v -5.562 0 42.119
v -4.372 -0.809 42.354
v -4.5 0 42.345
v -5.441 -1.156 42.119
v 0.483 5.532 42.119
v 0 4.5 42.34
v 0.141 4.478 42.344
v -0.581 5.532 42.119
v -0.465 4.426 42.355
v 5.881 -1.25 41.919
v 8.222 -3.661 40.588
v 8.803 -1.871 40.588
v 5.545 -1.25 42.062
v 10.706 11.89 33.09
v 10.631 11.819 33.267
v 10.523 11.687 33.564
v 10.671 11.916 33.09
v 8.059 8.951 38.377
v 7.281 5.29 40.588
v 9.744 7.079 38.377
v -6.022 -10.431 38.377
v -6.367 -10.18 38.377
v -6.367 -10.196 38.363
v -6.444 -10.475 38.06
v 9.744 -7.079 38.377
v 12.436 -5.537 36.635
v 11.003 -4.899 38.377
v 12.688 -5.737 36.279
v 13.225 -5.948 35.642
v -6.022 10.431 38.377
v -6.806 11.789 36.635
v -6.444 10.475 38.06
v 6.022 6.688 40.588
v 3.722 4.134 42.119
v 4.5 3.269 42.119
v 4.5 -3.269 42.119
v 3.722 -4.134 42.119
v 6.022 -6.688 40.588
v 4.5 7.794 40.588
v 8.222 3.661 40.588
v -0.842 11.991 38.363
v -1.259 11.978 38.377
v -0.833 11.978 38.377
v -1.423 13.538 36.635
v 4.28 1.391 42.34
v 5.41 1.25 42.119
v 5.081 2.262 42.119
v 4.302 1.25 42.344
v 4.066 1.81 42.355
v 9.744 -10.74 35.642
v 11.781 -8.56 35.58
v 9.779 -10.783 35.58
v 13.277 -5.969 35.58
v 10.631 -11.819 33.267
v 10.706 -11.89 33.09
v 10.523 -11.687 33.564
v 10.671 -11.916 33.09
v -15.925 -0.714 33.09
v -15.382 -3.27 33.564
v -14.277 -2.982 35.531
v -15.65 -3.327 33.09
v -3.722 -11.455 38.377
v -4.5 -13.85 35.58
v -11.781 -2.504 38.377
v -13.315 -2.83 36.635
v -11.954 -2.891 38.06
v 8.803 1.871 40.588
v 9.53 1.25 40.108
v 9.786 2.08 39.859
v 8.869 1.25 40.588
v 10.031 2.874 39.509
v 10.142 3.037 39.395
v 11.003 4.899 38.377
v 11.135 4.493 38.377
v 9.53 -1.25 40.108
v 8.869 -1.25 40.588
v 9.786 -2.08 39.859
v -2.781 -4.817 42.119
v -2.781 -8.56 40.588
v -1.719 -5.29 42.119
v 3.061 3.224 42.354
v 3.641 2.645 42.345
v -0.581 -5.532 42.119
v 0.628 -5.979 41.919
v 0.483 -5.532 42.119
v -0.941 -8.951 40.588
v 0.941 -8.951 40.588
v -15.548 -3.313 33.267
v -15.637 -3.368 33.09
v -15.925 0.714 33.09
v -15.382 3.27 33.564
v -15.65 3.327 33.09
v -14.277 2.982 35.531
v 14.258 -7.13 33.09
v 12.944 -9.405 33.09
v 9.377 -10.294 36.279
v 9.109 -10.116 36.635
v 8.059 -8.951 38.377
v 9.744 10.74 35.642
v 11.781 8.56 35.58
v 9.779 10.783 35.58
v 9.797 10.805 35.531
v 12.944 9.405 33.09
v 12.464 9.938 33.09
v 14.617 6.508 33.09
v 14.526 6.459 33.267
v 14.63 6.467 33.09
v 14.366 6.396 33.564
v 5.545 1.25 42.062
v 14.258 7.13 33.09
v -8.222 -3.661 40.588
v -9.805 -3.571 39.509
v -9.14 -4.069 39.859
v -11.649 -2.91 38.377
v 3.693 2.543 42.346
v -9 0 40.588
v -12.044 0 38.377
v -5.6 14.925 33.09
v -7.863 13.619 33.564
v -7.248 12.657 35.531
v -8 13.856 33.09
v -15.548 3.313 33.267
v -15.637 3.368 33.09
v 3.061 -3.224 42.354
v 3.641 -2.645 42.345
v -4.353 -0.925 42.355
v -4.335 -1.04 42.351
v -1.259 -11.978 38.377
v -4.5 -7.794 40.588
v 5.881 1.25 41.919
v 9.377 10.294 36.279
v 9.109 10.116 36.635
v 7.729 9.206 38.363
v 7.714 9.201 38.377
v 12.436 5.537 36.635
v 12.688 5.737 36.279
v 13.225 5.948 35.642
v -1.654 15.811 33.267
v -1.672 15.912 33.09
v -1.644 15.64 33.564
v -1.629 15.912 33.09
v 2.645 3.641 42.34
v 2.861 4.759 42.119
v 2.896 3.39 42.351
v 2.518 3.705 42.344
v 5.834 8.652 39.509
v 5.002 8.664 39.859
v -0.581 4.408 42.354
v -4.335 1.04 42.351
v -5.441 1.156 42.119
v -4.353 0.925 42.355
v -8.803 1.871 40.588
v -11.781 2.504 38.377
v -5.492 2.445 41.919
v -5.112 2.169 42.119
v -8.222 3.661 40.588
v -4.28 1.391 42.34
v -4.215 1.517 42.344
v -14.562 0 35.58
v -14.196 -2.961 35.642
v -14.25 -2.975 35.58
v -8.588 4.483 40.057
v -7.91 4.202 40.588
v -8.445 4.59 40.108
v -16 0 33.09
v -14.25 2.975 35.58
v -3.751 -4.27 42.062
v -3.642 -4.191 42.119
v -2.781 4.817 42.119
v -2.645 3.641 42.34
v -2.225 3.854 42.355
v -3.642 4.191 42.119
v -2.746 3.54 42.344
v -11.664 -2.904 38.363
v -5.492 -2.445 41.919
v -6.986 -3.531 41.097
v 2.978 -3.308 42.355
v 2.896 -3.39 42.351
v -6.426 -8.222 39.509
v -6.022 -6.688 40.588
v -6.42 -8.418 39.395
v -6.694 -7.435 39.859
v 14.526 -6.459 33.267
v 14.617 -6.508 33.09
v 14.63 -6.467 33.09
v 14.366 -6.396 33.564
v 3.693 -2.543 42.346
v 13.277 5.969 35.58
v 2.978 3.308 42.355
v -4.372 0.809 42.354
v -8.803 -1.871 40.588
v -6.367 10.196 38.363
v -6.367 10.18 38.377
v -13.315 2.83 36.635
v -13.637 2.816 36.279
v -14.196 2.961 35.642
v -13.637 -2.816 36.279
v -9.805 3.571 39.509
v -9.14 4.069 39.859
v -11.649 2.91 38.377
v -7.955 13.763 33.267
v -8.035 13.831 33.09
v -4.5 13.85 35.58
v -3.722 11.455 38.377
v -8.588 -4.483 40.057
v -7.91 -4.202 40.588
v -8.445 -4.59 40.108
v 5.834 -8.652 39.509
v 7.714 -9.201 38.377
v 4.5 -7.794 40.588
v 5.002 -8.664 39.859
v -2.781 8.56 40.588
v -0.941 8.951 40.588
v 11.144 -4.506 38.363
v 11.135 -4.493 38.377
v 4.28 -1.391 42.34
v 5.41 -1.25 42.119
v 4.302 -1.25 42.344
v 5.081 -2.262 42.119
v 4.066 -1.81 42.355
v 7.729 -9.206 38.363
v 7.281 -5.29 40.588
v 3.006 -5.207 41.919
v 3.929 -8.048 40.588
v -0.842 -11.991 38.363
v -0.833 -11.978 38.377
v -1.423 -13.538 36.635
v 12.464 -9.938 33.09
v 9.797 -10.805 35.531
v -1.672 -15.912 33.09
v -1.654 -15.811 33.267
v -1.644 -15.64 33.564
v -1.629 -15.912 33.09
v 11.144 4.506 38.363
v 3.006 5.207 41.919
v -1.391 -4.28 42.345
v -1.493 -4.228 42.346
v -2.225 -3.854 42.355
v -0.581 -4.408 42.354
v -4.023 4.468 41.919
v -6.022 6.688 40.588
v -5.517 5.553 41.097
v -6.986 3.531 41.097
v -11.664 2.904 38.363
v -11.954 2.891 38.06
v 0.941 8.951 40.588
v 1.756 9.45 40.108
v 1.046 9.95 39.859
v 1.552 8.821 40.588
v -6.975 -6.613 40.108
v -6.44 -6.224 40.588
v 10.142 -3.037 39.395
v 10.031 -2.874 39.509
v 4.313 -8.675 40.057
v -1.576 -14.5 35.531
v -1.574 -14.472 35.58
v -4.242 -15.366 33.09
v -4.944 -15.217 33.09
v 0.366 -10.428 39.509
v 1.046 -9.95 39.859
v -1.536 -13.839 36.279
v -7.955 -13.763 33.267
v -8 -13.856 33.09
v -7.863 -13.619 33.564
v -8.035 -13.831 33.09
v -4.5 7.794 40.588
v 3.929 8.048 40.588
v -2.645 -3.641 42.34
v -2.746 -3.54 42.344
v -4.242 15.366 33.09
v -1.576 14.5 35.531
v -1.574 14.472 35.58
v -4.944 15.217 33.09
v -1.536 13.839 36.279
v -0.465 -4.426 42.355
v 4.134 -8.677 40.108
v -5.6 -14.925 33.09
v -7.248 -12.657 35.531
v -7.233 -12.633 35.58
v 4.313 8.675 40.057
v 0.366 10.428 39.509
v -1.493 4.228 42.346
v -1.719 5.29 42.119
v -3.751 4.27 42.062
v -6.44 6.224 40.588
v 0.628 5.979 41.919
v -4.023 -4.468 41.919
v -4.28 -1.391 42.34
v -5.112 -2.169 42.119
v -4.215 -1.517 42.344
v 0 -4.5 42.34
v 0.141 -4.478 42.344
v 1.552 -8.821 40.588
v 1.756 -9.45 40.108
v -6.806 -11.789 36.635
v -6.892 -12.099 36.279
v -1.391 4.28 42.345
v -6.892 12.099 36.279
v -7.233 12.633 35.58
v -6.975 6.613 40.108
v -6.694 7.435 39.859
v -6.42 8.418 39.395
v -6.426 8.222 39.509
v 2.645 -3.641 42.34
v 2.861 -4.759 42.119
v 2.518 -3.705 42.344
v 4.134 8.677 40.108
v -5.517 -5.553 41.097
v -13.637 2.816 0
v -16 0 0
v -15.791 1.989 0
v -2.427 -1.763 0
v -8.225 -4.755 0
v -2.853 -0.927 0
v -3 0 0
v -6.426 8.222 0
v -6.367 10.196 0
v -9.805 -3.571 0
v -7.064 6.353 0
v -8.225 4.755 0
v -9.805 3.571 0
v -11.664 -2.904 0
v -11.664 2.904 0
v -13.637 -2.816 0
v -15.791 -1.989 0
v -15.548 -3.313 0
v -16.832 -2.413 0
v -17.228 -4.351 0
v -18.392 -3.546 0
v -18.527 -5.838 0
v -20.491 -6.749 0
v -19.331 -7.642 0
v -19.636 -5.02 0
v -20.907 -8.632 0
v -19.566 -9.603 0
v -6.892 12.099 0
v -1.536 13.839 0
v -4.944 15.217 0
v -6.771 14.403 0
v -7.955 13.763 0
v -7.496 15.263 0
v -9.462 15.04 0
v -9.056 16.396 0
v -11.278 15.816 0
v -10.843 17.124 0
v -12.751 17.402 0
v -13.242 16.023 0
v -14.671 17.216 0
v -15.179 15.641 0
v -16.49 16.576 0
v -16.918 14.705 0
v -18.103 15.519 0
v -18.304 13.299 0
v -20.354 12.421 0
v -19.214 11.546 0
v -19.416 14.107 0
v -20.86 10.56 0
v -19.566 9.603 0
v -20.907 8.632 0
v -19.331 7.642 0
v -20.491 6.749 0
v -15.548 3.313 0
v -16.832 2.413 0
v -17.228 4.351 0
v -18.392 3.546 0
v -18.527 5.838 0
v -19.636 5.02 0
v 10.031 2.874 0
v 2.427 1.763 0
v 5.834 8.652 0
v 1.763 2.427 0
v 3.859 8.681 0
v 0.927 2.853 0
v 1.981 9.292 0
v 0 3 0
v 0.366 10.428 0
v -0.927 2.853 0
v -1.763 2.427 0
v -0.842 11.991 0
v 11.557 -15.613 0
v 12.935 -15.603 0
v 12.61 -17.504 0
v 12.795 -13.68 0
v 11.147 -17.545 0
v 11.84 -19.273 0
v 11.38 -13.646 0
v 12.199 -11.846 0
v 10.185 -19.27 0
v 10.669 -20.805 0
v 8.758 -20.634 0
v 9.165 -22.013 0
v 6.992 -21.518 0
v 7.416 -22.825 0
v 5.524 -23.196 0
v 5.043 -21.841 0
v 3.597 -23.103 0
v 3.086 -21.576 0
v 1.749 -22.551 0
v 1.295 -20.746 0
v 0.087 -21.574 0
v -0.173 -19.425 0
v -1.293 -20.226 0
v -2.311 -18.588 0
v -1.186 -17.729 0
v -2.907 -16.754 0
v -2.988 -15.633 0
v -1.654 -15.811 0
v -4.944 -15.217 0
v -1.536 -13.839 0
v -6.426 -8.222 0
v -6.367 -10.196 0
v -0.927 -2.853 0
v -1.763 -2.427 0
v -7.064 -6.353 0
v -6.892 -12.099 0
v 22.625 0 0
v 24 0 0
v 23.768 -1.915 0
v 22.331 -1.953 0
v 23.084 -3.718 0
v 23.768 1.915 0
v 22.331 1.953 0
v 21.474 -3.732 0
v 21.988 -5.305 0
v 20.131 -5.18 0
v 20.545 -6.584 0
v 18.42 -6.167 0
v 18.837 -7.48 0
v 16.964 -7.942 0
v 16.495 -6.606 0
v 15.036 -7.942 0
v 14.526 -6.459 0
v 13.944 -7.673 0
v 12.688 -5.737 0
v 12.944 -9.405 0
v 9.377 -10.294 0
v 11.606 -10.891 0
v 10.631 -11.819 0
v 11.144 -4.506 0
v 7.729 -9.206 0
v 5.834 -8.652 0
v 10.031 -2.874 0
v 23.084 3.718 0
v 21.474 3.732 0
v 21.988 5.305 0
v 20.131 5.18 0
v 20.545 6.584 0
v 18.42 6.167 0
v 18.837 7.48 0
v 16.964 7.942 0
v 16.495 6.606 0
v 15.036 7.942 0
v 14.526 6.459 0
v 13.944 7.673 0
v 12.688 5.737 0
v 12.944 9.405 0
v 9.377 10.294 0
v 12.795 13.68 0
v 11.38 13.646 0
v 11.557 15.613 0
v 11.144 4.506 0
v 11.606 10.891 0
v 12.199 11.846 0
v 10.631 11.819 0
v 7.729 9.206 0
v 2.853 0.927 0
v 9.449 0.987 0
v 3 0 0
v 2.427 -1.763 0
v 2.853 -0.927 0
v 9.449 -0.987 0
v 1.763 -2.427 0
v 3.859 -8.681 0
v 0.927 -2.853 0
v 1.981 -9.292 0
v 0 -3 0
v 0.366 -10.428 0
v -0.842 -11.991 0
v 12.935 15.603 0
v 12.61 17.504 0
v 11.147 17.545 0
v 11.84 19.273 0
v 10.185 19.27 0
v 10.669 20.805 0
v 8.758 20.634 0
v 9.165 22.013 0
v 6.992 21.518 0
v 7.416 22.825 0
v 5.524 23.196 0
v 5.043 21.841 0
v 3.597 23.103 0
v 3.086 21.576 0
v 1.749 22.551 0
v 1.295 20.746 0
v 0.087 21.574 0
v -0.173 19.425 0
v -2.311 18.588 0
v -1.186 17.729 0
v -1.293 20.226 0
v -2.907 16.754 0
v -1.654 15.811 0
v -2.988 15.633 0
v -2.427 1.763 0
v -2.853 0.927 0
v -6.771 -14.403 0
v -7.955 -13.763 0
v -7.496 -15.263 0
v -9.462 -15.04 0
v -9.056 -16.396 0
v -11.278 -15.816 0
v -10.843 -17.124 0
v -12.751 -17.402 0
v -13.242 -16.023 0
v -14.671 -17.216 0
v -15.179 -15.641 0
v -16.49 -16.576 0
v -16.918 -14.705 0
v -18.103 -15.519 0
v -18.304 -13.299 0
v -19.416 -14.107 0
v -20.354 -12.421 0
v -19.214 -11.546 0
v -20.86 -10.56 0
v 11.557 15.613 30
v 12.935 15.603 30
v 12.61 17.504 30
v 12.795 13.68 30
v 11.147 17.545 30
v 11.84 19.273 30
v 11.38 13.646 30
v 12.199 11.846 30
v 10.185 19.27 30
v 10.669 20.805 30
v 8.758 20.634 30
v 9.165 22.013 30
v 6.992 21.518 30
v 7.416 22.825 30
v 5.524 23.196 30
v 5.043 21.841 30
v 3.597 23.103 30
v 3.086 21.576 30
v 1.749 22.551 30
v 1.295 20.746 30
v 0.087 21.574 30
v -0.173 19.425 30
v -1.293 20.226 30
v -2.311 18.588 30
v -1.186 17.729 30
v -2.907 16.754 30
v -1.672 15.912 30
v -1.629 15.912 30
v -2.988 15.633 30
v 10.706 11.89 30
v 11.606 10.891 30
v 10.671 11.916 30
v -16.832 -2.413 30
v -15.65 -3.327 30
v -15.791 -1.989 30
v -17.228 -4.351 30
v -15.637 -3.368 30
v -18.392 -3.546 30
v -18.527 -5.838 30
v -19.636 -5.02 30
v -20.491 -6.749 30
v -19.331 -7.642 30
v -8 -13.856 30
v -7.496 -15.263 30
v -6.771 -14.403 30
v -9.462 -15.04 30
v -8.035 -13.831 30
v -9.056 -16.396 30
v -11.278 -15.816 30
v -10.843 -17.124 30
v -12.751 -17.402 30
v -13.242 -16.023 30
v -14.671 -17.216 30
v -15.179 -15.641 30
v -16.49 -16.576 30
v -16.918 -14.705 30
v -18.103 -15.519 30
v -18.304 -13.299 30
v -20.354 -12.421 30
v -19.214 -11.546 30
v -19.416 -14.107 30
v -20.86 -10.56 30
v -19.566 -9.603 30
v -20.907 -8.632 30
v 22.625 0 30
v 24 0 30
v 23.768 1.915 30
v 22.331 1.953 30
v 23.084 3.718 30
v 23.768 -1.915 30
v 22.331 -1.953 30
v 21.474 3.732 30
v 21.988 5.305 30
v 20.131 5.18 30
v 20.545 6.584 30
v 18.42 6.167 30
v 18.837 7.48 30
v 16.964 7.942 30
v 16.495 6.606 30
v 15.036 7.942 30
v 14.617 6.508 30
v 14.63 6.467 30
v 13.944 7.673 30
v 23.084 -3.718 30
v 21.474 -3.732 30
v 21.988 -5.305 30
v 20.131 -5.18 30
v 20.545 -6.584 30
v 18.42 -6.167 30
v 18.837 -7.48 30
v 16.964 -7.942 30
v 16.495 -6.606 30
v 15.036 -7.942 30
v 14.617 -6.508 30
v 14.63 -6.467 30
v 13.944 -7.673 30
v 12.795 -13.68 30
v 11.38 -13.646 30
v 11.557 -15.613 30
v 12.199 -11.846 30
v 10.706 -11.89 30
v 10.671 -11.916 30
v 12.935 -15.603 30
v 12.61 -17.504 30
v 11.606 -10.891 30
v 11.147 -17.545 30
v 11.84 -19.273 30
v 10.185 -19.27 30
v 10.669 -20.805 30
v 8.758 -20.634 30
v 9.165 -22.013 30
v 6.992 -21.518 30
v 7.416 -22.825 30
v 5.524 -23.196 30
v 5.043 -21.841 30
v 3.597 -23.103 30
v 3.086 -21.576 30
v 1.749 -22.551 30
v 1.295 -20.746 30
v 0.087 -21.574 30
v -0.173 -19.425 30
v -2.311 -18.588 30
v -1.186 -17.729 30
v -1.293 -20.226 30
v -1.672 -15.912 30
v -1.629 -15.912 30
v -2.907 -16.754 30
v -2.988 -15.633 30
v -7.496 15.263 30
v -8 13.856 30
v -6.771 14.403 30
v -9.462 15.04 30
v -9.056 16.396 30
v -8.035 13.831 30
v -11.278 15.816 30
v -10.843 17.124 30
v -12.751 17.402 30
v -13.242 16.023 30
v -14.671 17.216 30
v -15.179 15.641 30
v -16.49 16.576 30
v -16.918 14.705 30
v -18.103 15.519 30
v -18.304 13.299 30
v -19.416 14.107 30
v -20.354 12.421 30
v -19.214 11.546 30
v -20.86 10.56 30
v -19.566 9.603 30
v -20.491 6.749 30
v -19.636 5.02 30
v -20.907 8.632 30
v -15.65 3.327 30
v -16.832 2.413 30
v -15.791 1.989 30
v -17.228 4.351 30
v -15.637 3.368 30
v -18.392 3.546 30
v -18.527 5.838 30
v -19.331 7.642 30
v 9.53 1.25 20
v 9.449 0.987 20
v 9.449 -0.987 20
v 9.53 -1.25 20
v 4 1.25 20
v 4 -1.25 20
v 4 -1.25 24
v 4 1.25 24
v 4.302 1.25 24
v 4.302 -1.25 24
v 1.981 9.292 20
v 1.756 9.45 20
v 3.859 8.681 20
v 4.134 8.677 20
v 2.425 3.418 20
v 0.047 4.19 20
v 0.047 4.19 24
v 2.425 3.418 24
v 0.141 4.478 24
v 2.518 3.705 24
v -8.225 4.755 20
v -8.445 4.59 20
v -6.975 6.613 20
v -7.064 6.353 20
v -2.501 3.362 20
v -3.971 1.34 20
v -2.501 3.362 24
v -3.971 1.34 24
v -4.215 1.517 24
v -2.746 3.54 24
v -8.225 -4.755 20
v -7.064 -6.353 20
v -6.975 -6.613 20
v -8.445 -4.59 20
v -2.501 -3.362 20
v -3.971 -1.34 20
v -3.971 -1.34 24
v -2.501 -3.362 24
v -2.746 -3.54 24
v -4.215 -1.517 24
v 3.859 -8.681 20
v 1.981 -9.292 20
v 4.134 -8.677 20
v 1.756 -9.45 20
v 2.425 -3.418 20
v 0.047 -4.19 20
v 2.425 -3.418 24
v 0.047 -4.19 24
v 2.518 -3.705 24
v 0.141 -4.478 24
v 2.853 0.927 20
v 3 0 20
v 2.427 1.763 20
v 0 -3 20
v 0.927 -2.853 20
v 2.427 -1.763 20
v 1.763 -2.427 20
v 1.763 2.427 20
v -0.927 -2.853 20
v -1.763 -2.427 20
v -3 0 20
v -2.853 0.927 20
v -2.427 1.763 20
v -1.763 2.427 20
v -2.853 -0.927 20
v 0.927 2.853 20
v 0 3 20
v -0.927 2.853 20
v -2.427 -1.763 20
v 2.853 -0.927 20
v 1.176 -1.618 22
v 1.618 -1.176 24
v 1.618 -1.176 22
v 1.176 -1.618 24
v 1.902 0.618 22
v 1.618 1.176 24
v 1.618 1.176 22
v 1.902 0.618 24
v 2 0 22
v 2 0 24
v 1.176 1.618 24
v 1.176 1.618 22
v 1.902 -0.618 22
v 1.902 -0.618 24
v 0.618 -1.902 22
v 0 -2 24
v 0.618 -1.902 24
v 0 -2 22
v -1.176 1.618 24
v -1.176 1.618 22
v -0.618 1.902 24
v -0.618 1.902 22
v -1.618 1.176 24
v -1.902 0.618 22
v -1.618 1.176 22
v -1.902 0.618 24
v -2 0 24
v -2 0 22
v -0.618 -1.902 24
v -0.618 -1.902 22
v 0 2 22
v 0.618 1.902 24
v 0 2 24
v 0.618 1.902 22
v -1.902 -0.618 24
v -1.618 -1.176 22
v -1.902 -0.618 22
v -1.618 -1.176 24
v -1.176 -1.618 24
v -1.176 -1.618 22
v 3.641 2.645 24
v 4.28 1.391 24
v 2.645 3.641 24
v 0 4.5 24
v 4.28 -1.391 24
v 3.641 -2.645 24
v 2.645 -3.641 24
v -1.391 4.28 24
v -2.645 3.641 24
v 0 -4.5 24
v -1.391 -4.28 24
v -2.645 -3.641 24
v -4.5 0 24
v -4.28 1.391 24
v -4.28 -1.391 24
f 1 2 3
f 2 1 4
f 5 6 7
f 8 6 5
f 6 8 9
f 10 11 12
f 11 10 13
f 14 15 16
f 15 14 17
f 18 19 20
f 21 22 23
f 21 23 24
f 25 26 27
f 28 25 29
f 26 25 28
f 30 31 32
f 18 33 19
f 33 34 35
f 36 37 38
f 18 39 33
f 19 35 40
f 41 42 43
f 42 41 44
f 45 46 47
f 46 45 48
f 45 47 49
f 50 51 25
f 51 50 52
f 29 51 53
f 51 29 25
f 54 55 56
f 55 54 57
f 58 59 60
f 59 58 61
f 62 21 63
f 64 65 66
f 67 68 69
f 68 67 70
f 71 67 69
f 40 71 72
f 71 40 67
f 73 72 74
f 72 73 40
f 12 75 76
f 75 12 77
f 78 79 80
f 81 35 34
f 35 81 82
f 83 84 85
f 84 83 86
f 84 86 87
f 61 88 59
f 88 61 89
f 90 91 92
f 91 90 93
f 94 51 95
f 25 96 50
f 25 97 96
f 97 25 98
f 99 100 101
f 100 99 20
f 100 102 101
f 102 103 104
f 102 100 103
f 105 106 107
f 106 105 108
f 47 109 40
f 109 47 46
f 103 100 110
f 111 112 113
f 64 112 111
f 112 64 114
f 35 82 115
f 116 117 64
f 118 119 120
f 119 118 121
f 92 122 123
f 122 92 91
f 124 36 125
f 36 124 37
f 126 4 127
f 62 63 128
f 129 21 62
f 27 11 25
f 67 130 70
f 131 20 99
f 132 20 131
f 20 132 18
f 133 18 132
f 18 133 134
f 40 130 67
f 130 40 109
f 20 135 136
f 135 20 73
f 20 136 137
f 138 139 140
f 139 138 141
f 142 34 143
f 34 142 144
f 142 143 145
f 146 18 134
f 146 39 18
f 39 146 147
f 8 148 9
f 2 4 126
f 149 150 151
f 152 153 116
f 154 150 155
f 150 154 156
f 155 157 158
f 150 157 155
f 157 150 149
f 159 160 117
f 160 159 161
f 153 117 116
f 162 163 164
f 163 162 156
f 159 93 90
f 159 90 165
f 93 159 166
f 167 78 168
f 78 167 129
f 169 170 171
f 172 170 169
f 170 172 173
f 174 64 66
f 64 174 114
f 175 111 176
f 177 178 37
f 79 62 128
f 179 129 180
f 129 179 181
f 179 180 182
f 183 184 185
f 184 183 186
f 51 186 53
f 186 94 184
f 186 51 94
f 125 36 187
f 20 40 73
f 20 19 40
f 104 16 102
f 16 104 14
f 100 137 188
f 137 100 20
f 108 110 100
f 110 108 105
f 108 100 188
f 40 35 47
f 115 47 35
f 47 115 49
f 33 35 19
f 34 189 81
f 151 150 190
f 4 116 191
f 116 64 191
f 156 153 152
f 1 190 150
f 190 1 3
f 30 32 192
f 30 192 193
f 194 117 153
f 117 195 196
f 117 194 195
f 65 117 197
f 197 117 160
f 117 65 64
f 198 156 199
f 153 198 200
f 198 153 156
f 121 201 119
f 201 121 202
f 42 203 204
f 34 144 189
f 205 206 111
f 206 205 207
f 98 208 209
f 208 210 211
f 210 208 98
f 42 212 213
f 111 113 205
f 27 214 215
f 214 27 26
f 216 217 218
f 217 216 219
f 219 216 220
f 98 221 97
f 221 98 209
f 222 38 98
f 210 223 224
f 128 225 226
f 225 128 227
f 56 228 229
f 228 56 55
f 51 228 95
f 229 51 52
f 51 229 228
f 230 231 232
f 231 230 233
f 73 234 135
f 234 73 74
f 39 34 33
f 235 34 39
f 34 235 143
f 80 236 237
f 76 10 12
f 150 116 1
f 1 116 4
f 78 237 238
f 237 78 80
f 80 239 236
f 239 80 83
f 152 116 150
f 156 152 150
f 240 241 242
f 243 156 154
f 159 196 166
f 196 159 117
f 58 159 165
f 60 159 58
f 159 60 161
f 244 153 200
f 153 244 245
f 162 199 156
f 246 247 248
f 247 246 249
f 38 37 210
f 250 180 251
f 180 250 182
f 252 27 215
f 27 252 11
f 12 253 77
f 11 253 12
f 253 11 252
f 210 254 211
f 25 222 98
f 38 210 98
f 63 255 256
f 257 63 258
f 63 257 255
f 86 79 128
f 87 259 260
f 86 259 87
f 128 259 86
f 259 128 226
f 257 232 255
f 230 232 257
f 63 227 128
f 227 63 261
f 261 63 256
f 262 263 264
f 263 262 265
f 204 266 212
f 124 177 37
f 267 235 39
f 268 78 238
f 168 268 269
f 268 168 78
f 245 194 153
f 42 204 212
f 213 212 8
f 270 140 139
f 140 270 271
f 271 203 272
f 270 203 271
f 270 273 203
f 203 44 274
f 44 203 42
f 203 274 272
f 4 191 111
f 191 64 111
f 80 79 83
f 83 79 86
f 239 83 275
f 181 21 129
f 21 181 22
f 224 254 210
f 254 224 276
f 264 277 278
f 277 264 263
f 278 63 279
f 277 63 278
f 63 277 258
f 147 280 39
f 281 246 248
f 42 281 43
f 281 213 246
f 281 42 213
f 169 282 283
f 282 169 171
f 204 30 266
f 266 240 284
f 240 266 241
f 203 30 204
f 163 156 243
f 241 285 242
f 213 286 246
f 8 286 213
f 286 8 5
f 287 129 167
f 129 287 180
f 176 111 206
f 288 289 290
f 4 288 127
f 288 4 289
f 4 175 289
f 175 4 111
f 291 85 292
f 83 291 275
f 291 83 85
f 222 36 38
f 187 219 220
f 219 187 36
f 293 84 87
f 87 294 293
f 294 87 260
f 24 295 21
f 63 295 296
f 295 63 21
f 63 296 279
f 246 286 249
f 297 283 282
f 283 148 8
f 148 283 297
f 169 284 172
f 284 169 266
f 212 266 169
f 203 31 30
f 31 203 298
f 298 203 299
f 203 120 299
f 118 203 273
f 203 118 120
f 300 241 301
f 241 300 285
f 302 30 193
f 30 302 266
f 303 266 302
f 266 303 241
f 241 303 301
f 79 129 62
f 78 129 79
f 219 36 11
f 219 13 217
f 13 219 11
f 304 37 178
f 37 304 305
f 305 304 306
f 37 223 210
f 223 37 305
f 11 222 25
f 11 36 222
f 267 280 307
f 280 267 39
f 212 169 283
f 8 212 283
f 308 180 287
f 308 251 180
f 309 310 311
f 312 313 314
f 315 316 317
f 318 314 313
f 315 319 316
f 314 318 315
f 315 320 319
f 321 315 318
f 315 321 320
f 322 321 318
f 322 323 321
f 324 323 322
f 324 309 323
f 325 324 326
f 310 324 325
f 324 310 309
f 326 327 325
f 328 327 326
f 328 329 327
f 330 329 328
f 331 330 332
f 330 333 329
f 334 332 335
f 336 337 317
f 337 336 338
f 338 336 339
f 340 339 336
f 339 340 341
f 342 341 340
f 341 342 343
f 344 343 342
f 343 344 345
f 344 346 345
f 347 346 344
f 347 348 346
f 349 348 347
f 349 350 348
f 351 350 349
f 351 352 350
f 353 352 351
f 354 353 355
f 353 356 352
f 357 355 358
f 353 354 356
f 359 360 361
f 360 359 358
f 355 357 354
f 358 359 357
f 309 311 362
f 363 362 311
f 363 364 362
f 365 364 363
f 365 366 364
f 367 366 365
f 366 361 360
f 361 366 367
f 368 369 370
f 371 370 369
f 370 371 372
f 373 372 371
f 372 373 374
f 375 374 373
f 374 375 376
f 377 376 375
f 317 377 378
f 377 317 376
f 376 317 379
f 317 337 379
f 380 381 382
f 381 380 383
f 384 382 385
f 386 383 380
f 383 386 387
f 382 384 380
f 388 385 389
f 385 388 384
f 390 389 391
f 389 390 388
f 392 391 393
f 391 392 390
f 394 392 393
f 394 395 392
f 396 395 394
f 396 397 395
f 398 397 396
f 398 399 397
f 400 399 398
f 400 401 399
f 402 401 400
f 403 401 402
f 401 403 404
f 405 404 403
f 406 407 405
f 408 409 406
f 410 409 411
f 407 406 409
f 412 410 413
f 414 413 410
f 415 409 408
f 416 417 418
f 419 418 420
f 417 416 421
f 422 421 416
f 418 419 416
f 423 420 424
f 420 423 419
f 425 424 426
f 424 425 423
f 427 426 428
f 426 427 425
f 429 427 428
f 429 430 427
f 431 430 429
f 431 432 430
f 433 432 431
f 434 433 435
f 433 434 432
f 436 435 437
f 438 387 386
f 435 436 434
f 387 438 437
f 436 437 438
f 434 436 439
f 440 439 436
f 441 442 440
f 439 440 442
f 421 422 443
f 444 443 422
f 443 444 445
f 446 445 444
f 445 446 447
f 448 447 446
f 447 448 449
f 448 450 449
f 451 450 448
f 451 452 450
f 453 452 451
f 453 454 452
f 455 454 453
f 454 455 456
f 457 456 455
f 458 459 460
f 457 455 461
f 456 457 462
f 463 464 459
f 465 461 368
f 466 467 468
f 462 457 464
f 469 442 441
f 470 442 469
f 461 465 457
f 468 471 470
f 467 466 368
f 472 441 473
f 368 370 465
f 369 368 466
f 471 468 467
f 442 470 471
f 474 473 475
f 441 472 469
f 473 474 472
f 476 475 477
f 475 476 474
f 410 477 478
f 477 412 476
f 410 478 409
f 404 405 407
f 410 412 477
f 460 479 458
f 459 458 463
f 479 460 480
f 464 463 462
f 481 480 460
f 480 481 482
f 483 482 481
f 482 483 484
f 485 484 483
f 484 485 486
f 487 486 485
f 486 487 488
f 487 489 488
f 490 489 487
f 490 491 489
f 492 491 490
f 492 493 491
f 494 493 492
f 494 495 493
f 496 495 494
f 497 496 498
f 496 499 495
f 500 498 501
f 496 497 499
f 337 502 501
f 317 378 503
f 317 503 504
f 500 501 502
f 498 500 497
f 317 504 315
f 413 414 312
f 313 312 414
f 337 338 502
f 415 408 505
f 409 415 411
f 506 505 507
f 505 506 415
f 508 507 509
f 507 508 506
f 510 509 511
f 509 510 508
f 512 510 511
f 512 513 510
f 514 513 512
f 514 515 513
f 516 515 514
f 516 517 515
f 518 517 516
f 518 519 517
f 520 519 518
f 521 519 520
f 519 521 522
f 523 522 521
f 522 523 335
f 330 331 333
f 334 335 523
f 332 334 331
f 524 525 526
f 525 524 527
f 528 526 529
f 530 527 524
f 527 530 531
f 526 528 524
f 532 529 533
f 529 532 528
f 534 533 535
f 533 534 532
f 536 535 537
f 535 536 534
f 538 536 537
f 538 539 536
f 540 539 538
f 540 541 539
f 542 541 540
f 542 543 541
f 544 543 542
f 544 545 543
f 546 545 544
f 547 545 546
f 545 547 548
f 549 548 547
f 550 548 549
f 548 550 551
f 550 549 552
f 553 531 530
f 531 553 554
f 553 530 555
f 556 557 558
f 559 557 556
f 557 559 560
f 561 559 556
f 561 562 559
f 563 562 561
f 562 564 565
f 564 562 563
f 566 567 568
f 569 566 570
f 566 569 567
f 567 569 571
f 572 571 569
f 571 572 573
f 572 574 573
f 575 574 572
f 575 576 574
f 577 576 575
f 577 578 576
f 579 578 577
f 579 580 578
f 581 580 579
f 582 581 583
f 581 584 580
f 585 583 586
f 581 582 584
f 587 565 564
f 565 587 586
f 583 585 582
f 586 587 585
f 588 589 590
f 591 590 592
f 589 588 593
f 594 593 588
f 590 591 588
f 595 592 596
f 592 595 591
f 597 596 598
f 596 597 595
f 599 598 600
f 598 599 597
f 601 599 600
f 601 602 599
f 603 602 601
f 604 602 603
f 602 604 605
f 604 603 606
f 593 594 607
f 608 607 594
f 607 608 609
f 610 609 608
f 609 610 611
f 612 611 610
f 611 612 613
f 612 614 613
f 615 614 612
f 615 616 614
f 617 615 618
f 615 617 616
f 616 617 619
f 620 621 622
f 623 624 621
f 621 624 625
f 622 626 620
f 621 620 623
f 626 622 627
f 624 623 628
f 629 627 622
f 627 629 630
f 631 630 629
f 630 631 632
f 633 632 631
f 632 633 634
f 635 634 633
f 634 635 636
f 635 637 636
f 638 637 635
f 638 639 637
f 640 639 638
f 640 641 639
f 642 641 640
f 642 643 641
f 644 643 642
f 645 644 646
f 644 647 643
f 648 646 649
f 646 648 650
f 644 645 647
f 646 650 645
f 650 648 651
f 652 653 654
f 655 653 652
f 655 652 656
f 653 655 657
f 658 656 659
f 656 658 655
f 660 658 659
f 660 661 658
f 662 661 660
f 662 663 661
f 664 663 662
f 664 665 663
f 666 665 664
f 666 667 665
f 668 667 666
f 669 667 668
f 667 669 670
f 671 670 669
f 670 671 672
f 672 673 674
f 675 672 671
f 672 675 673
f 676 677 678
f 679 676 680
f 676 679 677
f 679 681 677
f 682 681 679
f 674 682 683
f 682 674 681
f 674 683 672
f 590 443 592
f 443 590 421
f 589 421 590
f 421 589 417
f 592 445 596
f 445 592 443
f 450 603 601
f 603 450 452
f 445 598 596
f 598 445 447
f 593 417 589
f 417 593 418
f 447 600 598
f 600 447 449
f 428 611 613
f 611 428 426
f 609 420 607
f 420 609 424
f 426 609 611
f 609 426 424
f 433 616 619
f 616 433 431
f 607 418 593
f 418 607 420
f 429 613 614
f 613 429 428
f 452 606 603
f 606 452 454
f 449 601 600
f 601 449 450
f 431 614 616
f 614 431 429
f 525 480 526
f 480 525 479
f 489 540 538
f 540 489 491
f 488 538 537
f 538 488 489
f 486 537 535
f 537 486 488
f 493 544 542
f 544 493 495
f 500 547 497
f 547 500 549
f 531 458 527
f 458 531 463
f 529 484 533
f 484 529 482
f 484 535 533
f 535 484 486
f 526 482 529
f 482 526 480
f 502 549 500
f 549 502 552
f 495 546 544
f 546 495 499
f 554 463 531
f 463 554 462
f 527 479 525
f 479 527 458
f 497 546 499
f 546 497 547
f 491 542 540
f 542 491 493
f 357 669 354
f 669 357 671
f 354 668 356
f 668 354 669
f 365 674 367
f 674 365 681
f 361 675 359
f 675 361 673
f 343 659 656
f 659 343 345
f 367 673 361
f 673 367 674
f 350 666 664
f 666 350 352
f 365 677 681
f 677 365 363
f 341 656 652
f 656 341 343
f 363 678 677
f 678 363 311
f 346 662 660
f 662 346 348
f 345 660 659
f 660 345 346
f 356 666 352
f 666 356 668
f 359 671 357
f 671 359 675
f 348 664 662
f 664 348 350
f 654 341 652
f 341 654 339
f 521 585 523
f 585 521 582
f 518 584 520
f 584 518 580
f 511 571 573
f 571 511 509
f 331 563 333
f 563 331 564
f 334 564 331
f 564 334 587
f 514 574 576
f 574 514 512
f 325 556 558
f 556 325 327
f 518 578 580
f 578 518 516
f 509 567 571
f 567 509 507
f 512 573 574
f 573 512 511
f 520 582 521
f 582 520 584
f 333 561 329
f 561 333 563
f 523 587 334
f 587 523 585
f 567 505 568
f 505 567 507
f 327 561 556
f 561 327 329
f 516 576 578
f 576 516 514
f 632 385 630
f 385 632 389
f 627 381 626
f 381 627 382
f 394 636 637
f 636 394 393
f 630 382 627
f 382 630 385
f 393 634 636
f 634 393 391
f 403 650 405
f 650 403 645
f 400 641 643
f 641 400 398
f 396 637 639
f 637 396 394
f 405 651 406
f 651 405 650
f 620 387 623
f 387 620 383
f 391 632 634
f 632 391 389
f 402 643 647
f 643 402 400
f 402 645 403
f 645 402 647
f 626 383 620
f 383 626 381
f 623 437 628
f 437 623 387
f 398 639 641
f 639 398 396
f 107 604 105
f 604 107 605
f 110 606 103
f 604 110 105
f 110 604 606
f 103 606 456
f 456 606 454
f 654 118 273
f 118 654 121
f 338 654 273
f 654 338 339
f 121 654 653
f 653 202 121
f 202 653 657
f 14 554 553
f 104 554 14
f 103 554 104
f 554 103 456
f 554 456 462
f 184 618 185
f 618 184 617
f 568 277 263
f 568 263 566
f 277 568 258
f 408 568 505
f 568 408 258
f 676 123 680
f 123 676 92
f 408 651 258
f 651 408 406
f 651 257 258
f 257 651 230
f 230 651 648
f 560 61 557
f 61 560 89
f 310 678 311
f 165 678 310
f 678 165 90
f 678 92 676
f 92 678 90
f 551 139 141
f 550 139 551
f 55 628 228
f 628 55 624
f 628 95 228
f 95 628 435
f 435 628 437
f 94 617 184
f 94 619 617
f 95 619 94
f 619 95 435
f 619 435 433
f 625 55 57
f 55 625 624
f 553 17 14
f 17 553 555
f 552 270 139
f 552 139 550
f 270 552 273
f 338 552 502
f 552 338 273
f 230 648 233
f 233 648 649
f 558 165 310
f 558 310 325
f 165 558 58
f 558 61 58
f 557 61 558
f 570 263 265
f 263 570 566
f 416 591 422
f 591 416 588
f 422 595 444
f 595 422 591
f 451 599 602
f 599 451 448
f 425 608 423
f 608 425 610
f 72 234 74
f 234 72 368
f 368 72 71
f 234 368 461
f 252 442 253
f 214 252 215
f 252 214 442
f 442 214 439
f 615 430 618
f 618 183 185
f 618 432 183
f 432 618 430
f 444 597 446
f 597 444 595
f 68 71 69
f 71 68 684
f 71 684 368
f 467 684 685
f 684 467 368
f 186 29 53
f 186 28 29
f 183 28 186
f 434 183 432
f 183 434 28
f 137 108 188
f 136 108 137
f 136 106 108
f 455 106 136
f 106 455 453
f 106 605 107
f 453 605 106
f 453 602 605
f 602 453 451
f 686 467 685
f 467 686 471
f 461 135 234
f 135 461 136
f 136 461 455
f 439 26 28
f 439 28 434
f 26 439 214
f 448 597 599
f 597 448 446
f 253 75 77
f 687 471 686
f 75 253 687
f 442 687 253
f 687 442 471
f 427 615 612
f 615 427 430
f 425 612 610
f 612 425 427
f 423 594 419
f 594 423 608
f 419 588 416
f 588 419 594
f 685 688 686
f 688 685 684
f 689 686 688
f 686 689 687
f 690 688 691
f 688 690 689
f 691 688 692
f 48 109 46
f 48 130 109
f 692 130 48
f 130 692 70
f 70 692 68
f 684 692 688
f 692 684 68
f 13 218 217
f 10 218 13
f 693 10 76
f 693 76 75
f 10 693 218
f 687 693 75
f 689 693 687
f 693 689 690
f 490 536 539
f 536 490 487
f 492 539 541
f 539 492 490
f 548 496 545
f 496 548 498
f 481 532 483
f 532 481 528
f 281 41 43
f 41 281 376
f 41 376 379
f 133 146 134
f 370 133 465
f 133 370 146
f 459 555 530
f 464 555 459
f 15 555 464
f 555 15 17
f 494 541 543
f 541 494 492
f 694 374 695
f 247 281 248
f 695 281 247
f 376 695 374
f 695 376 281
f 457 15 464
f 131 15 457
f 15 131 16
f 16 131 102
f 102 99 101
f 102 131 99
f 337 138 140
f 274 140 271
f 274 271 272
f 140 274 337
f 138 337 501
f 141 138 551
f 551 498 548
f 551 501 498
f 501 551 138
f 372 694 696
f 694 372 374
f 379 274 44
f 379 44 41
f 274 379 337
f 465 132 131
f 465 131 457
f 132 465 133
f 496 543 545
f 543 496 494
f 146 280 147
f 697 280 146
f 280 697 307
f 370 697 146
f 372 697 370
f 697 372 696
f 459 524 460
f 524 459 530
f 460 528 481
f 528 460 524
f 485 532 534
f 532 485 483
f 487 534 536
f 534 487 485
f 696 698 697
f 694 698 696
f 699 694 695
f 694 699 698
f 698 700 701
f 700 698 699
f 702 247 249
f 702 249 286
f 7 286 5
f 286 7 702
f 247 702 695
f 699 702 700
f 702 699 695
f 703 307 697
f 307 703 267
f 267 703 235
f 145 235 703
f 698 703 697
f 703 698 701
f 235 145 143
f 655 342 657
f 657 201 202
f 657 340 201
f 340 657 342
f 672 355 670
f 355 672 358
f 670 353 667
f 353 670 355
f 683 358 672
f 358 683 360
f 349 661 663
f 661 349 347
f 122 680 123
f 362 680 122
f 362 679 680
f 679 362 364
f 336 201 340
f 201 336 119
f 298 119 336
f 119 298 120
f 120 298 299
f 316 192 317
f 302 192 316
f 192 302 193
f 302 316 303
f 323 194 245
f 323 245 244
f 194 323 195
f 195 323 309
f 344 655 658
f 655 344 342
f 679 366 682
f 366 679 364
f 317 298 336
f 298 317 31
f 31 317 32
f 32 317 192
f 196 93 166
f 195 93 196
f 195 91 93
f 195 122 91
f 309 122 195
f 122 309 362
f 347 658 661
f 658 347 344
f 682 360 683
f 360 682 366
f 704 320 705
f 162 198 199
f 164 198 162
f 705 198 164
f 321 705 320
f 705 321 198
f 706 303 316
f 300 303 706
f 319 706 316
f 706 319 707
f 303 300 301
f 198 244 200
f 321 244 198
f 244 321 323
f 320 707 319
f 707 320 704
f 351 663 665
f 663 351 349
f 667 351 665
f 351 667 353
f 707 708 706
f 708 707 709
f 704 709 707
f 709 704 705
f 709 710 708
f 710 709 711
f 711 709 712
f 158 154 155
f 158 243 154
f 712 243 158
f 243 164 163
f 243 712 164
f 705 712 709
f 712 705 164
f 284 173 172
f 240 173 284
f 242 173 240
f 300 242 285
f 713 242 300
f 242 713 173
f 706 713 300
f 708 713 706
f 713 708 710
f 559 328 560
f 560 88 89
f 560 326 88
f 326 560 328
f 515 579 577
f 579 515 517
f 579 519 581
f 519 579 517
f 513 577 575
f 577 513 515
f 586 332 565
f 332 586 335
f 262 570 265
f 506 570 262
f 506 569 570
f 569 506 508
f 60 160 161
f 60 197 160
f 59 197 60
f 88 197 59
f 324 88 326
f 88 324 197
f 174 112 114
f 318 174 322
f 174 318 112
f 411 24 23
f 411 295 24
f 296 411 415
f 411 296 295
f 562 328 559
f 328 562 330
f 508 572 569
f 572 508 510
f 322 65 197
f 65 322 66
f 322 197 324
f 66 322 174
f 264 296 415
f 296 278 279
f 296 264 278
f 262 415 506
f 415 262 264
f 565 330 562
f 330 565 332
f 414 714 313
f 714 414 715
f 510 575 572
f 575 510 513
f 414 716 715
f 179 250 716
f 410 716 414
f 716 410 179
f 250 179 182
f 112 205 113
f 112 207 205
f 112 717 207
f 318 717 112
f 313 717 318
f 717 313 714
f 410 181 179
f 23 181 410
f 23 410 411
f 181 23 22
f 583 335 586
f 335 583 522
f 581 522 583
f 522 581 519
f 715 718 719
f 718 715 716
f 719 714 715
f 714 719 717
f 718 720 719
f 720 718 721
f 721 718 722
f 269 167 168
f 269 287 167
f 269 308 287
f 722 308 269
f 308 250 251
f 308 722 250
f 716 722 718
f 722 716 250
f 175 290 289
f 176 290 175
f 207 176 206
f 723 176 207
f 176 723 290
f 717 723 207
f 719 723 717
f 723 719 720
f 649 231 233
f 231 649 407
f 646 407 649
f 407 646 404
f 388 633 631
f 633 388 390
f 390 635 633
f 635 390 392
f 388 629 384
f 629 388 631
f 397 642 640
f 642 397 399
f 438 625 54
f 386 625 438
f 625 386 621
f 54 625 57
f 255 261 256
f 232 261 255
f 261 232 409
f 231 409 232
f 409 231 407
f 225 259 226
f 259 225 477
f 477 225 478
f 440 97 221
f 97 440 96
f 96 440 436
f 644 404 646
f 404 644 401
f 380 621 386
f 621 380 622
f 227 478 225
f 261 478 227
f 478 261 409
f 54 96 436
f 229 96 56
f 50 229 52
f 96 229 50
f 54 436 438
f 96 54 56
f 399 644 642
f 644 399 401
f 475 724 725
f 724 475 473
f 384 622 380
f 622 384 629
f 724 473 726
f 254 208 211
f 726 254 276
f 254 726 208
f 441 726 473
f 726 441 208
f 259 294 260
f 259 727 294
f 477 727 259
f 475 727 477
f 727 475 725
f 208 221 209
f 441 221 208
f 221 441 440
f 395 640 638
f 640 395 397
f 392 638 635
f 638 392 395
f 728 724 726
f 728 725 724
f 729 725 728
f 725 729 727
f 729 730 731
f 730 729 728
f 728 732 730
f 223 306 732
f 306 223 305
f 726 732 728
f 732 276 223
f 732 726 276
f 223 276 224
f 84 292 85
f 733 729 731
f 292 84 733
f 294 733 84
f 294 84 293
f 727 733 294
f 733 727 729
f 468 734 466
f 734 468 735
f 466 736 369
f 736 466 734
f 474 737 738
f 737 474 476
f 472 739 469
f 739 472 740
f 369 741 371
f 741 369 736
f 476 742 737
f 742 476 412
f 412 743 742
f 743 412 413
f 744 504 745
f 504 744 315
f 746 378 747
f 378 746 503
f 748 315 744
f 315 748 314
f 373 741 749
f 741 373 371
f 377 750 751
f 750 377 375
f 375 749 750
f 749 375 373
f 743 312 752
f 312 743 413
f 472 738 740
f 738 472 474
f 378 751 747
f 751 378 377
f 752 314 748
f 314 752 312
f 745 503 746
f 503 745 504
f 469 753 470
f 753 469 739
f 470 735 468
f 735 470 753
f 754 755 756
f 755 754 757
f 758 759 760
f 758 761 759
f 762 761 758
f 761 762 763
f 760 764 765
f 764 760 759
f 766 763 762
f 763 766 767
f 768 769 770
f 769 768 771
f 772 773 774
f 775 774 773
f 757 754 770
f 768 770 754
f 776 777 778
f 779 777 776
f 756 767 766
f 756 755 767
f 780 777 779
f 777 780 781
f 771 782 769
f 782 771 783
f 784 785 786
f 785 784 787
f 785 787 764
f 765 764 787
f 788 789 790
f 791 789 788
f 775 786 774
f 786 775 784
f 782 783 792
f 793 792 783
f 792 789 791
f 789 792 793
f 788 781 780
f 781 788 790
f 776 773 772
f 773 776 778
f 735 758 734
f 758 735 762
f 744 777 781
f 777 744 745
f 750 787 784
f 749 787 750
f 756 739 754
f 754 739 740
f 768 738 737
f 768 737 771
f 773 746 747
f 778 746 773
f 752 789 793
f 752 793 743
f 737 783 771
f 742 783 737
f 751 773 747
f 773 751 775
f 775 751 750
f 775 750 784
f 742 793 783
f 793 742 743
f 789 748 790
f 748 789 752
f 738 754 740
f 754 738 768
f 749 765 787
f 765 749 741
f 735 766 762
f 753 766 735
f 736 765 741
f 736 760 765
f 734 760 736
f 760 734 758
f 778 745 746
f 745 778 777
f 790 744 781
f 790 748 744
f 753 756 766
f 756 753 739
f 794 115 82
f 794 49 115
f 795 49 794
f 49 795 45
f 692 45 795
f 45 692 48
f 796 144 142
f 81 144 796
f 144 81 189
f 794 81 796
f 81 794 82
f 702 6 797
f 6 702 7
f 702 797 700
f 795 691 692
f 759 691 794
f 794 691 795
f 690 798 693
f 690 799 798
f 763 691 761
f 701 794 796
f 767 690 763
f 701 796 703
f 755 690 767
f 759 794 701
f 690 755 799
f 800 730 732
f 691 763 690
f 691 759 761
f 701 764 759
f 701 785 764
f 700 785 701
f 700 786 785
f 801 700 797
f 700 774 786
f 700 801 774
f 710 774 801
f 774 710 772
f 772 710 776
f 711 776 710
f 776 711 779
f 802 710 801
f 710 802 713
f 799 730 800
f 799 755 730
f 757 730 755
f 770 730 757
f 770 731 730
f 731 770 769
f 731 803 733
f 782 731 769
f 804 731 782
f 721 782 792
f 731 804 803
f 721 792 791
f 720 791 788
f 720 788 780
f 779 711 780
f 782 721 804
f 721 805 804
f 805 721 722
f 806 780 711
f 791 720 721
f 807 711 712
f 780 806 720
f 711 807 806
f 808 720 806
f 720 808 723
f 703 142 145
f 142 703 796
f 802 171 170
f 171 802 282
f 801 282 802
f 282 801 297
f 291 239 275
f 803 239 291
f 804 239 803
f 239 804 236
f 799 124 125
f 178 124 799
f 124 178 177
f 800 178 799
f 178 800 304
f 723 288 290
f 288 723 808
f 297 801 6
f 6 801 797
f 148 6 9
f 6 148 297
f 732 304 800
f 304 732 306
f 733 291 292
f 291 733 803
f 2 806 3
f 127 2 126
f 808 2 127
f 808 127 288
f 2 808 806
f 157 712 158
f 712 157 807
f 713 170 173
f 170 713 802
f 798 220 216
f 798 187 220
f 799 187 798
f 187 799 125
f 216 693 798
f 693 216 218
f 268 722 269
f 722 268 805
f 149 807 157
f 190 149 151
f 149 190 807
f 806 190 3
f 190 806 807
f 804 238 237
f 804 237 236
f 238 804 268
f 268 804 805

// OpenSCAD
difference(){
    //top bump
    intersection(){
        union(){
            translate([0,0,25]) sphere(18);
            cylinder(30, r=50);
        }
        union(){
            cylinder(50,r=16);
            
            //barrels
            for(i=[0:5]){
                rotate(72*i){
                    translate([16,0,0]) cylinder(30, r=8);
                }
            }
        }
    }
    //slots and chambers
    for(i=[0:5]){
        rotate(72*i){
            translate([16,0,-1]) cylinder(42, d=13.25);
            translate([4, -1.25, 20]) cube([10, 2.5, 25]);
        }
    }
    
    //center channel
    union() {
        $fn=20;
        translate([0,0,-1]) cylinder(21, d=6);        
        cylinder(41, d=4);
        translate([0,0,20]) cylinder(d1=6, d2=0, h=6);
        translate([0,0,24]) cylinder(30, d=9);
    }

}
